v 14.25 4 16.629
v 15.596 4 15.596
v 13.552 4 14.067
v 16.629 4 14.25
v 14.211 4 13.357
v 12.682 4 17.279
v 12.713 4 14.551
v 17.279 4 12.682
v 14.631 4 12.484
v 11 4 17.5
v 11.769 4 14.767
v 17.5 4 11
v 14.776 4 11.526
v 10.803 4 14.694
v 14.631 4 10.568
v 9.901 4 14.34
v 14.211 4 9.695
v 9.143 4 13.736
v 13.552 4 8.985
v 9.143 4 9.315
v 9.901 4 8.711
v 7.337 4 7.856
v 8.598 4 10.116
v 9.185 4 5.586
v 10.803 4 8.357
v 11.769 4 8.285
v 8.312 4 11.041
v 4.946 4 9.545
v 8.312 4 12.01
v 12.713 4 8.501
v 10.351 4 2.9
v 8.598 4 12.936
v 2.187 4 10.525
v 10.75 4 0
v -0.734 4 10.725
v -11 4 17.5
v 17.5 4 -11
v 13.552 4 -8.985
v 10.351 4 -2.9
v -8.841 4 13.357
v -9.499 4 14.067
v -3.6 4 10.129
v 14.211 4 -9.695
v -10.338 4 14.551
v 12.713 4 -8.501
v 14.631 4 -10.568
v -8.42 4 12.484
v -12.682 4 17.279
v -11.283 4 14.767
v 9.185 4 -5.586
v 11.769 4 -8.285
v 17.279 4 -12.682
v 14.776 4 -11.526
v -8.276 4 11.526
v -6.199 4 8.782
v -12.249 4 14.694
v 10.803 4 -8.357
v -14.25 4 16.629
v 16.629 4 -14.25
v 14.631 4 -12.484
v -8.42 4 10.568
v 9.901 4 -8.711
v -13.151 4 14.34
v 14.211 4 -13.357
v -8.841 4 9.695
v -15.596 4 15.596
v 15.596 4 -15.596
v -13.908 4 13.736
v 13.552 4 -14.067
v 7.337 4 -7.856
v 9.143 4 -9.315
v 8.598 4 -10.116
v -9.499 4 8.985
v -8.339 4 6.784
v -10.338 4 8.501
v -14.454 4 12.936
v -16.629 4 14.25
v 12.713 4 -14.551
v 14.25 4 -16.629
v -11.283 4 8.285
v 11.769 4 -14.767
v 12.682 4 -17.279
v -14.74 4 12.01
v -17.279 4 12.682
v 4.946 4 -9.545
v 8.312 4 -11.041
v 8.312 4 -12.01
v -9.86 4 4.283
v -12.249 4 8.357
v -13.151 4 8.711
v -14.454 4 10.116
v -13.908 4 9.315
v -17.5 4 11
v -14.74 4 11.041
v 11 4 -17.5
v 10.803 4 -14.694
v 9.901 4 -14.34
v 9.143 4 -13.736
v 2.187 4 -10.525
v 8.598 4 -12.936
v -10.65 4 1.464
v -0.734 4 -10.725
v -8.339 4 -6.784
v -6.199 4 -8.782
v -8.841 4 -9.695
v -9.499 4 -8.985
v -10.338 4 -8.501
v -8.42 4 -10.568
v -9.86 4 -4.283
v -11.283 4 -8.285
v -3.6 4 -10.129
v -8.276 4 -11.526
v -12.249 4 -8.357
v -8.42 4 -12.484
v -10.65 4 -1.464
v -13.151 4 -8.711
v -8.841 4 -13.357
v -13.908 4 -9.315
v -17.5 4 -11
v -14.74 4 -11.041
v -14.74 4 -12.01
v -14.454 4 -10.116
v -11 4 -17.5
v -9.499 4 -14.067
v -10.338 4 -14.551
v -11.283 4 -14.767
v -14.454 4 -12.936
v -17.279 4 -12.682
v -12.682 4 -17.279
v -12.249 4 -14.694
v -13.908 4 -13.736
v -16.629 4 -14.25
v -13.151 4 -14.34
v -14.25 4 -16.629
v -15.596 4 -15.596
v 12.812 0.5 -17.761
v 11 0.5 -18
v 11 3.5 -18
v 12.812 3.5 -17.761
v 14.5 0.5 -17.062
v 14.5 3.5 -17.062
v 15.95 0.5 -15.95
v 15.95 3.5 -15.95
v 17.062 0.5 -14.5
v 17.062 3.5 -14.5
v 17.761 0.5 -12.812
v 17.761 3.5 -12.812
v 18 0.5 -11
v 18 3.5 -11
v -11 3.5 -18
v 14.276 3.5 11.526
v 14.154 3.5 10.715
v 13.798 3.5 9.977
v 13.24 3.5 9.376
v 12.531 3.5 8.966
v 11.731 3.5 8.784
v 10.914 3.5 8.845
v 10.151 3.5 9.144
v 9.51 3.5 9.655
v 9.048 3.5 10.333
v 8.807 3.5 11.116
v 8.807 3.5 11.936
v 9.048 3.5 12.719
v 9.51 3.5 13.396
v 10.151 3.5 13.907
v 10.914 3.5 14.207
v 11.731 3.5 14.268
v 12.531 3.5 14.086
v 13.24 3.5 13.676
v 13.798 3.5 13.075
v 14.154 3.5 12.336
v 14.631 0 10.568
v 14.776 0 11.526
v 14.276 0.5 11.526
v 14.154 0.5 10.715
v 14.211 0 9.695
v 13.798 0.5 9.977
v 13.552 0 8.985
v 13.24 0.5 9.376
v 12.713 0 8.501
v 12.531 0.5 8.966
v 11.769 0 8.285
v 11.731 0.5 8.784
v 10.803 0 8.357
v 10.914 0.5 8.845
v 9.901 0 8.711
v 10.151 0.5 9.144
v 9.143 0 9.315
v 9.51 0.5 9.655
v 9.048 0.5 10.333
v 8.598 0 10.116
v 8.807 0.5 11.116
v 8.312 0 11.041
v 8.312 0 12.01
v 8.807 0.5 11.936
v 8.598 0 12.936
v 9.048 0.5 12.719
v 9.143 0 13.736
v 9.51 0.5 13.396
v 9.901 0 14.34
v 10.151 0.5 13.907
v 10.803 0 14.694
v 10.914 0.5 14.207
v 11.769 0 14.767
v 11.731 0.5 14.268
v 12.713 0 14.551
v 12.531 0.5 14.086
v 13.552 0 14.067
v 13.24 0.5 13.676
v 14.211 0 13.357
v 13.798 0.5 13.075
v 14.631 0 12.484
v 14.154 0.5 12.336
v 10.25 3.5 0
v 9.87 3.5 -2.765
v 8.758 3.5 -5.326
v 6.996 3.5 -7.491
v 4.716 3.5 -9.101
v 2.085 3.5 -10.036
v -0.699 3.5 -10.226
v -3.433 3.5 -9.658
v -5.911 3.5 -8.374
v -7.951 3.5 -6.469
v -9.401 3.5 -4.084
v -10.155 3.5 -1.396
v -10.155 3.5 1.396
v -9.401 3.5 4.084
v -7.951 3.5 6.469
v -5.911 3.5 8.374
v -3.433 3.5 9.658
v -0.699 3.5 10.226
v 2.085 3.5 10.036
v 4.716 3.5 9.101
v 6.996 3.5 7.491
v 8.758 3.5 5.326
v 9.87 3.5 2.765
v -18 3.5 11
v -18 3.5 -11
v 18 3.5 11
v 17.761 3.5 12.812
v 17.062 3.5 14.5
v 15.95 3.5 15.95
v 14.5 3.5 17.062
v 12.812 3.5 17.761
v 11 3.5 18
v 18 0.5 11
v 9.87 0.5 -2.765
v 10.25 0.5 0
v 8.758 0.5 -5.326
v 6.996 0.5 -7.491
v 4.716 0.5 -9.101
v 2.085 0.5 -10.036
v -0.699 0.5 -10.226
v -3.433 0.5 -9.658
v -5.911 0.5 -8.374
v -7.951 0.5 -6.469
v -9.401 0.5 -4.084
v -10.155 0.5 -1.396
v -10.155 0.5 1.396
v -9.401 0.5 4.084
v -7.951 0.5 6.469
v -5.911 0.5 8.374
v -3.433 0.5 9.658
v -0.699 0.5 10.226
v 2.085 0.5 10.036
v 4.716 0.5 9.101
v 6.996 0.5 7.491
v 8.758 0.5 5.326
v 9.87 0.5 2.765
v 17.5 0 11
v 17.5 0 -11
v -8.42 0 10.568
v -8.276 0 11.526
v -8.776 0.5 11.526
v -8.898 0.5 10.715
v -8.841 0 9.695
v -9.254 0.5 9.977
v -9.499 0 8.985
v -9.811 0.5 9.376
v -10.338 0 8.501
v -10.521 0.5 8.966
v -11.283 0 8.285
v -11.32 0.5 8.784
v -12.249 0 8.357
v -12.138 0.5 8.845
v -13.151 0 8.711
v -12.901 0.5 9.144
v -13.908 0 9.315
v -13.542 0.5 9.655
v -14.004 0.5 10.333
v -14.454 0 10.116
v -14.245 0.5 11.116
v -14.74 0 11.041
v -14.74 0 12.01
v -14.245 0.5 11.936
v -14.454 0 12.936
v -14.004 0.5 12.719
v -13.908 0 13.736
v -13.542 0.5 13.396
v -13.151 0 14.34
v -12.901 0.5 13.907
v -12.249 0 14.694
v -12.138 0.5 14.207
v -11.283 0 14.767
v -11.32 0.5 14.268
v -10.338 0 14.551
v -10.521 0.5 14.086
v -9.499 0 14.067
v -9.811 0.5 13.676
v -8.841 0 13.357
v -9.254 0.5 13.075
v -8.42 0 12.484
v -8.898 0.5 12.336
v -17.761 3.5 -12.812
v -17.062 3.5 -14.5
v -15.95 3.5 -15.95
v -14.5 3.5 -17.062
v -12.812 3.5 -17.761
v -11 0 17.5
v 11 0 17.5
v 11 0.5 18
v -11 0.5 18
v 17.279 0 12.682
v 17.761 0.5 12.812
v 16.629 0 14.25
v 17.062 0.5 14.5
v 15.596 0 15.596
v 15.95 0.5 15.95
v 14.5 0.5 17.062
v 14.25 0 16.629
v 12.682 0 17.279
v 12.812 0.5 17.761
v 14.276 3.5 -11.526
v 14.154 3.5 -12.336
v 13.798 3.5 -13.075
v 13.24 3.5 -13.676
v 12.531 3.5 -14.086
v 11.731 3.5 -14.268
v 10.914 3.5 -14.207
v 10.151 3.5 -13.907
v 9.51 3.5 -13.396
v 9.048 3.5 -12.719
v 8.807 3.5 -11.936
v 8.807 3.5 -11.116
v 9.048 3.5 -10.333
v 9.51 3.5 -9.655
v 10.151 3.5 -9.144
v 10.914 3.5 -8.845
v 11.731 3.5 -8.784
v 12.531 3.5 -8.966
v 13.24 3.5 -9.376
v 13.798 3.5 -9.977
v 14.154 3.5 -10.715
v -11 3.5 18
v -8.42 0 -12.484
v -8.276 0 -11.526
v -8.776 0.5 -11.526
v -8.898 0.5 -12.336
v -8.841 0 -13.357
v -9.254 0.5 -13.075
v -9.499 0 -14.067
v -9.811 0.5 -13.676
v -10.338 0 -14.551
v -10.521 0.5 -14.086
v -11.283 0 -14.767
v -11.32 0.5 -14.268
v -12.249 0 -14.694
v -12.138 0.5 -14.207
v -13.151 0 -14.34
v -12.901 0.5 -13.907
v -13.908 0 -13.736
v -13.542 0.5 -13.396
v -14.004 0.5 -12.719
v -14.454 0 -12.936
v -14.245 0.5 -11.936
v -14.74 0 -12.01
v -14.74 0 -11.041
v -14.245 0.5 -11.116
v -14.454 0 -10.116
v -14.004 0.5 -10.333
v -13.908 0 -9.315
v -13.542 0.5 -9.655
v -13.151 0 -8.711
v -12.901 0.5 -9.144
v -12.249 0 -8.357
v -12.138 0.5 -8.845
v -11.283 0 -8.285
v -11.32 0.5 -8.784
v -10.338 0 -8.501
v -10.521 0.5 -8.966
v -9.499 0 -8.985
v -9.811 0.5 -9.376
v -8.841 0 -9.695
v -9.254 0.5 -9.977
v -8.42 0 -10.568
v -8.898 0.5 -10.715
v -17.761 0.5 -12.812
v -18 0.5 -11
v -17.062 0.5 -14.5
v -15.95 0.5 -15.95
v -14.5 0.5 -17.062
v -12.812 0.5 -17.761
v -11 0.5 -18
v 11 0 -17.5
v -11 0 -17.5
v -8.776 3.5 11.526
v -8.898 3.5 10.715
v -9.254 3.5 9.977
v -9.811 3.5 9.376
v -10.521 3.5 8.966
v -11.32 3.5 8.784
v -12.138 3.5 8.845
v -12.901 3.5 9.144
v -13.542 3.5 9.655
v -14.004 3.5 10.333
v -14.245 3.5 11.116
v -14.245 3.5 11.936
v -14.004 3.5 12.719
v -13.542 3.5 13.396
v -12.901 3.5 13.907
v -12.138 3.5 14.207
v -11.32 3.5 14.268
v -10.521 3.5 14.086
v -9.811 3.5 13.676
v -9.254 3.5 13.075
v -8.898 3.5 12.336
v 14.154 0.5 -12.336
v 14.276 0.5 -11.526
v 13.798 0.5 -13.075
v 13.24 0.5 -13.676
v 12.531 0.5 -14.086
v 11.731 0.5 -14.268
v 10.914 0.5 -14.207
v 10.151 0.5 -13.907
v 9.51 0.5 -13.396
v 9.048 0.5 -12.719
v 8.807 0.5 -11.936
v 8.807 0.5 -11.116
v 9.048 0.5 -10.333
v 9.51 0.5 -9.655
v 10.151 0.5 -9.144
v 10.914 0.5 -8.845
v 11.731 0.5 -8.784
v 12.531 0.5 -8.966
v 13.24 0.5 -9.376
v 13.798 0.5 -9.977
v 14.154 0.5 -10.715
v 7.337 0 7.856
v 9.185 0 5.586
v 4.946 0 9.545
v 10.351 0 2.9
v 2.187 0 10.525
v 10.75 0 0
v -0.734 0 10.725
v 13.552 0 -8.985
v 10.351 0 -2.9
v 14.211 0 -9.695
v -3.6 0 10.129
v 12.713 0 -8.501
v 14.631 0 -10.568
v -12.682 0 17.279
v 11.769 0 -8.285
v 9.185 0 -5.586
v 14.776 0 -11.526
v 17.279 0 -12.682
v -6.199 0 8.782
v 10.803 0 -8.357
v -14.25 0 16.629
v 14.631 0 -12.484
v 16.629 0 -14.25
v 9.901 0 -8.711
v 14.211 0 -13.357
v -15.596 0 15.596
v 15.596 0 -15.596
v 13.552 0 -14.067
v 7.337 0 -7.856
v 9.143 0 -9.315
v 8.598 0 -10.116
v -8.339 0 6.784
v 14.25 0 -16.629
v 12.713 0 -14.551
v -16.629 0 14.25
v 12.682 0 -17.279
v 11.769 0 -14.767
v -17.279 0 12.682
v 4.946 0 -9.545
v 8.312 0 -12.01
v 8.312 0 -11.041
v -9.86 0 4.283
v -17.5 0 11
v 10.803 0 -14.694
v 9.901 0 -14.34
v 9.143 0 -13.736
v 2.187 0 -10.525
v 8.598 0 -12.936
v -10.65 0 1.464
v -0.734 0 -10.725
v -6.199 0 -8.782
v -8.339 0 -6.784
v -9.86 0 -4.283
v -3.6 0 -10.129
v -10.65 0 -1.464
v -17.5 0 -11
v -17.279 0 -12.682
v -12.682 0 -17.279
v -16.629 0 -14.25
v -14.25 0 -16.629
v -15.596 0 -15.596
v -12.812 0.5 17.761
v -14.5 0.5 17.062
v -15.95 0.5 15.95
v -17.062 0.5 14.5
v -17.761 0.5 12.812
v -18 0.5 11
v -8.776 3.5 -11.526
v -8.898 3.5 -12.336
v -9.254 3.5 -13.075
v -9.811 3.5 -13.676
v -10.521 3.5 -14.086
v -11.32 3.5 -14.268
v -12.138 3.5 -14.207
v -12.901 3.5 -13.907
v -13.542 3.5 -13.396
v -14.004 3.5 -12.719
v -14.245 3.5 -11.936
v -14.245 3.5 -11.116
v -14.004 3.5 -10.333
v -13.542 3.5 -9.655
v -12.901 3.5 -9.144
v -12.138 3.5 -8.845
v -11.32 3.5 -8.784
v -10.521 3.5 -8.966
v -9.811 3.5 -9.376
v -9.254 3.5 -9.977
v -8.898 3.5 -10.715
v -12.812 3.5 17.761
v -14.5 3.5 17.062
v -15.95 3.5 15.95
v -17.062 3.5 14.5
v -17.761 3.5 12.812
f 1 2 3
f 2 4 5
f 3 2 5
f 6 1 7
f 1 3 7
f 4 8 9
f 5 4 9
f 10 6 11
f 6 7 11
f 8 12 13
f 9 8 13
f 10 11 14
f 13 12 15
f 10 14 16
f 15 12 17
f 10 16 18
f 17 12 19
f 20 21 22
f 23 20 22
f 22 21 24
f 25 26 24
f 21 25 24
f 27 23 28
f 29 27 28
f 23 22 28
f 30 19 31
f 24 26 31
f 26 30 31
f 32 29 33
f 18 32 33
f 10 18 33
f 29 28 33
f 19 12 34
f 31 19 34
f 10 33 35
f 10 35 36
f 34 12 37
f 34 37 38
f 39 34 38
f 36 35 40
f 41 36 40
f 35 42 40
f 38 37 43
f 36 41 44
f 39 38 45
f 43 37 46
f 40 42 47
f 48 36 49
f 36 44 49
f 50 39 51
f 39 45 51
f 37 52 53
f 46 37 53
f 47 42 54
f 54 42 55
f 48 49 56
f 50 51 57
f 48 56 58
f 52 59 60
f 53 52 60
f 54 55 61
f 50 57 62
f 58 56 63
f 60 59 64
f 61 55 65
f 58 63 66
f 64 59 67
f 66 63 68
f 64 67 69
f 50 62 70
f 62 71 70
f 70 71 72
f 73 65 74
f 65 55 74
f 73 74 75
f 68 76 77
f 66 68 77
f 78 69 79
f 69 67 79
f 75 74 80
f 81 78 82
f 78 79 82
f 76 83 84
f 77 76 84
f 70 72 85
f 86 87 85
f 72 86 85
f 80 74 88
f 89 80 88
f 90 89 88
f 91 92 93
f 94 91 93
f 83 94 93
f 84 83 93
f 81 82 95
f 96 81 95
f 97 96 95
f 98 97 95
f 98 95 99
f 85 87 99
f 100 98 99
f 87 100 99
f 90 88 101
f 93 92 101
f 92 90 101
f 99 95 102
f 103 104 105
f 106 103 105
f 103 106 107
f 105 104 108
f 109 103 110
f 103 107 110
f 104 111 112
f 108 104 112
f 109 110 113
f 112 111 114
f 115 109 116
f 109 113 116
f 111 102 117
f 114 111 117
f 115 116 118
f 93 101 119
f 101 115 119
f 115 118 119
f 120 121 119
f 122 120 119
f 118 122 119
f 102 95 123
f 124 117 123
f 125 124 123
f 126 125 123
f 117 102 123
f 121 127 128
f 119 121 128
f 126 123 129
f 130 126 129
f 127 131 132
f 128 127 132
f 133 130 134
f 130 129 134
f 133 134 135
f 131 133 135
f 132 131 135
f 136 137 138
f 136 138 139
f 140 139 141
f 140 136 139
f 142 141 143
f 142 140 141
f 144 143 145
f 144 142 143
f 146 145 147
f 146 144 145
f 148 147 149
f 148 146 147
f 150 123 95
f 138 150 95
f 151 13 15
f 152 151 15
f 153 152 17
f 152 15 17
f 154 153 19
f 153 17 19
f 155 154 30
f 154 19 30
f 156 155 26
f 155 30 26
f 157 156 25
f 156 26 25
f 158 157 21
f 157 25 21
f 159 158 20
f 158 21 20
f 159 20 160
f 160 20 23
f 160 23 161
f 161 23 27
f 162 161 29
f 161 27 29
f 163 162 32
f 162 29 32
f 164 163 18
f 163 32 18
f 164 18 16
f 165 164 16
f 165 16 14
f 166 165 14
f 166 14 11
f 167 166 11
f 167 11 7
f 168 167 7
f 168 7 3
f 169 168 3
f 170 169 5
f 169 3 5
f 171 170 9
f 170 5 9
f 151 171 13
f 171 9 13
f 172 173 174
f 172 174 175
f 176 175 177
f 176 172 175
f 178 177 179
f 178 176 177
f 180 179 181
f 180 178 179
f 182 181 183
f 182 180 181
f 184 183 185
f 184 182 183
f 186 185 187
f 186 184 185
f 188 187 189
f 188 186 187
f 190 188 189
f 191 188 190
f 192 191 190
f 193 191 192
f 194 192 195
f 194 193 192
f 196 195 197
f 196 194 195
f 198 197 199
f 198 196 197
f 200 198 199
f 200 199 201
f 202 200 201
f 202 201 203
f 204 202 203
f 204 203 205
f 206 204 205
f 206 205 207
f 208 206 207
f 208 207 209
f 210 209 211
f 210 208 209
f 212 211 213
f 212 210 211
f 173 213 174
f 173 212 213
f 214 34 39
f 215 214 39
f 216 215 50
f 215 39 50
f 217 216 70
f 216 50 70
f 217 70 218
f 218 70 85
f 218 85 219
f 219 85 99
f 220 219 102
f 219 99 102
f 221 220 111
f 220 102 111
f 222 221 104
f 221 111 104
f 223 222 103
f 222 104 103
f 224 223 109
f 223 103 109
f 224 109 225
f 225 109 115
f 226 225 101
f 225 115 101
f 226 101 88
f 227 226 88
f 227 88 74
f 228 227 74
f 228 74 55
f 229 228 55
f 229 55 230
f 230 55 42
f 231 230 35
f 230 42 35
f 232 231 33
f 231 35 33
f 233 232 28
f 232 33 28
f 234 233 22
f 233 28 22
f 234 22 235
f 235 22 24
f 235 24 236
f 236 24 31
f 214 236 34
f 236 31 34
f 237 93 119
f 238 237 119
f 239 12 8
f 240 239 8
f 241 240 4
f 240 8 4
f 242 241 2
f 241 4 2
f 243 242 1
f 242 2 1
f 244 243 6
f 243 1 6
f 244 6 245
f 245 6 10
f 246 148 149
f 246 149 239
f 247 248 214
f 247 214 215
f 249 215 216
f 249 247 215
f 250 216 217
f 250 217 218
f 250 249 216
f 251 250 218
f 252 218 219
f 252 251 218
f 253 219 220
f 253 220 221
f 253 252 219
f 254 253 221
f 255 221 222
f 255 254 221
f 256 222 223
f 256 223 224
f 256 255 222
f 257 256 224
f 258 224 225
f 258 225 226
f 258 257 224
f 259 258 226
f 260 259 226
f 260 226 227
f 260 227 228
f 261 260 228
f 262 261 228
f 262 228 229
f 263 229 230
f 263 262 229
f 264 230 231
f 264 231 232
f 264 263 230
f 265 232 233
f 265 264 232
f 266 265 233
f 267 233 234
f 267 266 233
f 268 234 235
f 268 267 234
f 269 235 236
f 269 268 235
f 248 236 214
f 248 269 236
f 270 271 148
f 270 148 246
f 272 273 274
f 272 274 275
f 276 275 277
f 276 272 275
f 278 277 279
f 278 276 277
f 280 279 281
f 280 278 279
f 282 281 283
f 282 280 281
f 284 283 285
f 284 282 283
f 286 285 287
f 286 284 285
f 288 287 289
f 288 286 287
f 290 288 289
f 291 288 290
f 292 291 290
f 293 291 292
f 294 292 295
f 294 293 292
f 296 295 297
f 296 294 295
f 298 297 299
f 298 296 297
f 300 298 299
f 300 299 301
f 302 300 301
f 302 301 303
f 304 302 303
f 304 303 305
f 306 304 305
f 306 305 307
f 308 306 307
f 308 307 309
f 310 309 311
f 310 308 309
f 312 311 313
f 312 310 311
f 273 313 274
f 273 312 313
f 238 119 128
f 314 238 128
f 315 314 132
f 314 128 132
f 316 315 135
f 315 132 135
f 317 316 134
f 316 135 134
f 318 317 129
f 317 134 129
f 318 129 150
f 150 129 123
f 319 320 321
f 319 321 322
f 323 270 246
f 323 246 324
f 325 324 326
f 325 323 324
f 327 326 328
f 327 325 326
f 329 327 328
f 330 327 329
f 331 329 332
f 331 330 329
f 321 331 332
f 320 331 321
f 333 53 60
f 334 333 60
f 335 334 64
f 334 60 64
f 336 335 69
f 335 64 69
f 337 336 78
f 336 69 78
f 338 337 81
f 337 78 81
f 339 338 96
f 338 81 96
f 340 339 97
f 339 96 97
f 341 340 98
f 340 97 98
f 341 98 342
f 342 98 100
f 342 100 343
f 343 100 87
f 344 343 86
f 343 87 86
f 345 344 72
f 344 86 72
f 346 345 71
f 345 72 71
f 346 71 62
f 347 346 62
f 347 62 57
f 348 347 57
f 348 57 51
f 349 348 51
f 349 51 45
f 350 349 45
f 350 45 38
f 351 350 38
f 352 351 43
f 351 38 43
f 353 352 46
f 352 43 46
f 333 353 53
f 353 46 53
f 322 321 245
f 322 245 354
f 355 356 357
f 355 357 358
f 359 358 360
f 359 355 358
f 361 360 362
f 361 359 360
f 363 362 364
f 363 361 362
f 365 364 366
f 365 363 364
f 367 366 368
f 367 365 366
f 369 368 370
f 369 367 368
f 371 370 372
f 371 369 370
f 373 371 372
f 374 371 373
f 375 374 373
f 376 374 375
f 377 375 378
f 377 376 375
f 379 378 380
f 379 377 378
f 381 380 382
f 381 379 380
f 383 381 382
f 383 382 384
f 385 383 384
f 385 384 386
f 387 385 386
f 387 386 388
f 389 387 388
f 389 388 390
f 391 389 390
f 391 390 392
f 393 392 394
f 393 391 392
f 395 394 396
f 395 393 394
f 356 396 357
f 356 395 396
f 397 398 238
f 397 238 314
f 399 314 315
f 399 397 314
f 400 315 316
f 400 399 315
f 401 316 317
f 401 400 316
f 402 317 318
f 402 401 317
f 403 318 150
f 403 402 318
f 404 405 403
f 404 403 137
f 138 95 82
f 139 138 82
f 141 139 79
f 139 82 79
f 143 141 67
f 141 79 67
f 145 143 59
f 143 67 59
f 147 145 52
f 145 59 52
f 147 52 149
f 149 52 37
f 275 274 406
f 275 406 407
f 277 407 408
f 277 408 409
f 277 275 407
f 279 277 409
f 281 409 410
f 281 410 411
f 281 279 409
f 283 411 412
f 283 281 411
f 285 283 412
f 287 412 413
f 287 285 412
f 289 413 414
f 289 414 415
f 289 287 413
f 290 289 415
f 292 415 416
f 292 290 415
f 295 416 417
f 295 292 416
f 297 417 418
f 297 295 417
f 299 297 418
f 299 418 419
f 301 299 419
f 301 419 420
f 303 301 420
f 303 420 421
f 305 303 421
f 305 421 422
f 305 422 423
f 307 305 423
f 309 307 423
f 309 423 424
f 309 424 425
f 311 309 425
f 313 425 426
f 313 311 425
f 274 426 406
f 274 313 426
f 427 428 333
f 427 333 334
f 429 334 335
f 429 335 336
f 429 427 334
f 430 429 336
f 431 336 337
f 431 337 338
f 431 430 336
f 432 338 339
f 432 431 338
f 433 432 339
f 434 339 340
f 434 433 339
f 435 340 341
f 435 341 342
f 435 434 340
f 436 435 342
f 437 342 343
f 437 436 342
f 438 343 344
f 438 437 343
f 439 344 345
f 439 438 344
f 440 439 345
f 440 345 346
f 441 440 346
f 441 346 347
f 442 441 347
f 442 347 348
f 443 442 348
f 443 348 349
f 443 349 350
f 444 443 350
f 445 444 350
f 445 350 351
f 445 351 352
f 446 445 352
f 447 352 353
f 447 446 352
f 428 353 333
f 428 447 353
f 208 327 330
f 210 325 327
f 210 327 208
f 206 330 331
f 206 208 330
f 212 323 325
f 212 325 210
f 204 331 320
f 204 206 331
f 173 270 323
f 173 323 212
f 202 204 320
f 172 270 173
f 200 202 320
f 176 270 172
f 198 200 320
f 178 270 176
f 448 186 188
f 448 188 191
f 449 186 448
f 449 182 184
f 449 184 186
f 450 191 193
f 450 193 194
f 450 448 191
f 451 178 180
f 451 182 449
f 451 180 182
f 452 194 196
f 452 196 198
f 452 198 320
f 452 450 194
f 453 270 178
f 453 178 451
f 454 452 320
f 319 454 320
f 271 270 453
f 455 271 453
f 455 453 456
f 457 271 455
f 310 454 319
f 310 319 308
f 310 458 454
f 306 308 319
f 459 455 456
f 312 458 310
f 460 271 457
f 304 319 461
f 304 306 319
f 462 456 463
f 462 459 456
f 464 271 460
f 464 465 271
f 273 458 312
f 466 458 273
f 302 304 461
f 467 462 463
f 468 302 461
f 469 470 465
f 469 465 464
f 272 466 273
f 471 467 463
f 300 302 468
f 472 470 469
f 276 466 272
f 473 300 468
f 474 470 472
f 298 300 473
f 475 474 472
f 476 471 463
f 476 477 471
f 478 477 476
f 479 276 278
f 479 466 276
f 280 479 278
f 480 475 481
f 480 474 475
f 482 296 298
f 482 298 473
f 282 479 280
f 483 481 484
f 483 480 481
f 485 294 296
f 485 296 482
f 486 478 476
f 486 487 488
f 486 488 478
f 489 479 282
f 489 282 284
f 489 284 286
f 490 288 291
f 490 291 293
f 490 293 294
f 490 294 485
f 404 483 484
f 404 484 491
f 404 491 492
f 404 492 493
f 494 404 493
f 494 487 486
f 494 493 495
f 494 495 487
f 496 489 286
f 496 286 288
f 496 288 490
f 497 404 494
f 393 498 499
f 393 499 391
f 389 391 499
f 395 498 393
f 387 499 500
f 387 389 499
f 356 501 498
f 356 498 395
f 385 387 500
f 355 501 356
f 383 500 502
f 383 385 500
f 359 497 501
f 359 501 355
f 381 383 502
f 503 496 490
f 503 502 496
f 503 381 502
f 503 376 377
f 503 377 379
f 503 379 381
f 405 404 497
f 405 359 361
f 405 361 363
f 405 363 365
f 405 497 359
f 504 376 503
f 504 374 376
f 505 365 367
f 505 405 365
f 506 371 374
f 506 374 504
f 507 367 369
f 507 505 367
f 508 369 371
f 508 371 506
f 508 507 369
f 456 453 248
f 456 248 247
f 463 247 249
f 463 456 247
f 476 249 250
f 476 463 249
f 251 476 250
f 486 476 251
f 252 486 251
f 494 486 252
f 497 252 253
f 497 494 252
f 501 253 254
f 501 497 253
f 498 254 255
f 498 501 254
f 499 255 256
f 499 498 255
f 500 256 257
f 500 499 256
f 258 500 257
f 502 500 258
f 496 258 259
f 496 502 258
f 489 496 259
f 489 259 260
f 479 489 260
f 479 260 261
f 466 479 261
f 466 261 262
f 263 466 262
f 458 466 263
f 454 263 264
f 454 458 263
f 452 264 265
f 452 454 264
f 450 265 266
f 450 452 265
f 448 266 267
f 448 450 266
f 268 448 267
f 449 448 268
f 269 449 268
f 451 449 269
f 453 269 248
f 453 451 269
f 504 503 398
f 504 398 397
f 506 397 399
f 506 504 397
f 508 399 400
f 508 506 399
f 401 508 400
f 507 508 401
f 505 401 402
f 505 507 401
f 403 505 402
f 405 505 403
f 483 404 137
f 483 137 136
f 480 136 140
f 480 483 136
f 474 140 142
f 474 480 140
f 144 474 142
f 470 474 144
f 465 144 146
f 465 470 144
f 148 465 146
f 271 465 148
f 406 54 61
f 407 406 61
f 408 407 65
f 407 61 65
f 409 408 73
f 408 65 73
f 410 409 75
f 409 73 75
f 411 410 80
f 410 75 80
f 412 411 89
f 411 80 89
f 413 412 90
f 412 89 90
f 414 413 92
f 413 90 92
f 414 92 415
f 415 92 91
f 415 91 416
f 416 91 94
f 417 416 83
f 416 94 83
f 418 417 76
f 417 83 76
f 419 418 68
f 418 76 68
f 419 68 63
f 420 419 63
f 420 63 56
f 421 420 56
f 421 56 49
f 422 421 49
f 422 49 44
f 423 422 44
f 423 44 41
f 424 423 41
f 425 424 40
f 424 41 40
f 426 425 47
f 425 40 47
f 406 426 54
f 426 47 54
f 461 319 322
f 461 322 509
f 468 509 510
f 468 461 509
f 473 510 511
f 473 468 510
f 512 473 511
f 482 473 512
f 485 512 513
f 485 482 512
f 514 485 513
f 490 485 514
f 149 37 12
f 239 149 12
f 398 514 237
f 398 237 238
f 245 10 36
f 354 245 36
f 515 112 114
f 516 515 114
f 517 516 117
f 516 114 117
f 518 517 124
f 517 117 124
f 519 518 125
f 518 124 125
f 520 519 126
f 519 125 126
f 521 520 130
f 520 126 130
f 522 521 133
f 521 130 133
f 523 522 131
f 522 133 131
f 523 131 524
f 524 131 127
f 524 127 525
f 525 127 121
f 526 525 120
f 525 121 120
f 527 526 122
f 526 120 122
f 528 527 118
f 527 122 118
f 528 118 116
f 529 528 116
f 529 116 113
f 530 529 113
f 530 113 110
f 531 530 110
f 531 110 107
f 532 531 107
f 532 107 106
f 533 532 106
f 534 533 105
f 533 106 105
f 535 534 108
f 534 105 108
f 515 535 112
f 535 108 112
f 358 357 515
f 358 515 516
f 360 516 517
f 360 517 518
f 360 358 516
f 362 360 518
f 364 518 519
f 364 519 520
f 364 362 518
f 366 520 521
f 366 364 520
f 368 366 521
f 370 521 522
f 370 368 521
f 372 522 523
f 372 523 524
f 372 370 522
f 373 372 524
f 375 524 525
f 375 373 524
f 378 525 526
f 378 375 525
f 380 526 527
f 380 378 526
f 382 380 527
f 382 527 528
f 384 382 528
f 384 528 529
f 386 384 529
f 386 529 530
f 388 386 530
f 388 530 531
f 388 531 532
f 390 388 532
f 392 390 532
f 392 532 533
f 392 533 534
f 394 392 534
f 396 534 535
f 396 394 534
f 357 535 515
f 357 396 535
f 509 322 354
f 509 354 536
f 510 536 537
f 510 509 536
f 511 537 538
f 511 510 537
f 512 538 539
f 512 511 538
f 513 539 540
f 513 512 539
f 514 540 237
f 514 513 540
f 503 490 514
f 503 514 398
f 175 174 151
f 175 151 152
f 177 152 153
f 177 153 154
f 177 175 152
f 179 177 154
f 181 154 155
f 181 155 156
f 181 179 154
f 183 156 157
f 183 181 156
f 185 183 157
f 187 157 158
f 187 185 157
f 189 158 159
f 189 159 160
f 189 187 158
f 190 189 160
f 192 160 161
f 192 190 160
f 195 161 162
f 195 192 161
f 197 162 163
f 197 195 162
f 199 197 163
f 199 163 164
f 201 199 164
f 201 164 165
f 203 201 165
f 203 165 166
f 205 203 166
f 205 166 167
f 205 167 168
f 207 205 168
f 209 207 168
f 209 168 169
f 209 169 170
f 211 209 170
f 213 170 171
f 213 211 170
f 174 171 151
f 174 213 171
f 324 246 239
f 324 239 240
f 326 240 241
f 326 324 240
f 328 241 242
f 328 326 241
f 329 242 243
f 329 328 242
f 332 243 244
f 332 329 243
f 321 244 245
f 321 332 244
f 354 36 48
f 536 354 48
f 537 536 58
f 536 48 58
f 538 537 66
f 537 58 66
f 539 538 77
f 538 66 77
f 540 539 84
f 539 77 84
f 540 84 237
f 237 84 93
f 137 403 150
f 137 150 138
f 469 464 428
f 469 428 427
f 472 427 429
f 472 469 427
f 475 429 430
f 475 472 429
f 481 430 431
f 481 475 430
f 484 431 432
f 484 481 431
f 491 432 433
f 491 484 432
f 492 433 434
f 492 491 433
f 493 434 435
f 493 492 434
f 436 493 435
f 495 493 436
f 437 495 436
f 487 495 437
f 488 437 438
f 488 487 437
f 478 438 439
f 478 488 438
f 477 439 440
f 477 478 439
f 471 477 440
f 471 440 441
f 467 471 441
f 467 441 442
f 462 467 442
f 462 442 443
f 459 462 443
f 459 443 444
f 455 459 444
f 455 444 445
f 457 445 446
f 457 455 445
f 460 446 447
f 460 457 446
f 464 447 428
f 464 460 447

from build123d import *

# Parameters (mm, degrees)
SKETCH1_R           = 10.25
SKETCH1_R_2         = 2.75
BOSS_EXTRUDE1_DEPTH = 4
CHAMFER1_SIZE       = 0.5


with BuildPart() as part:
    # Sketch1 → Boss-Extrude1 (new body)
    with BuildSketch(Plane(origin=(0, 0, 0), x_dir=(1, 0, 0), z_dir=(0, 1, 0))):
        with BuildLine():
            Line((-11, 18), (11, 18))
            ThreePointArc((11, 18), (15.949747468, 15.949747468), (18, 11))
            Line((18, 11), (18, -11))
            ThreePointArc((18, -11), (15.949747468, -15.949747468), (11, -18))
            Line((11, -18), (-11, -18))
            ThreePointArc((-11, -18), (-15.949747468, -15.949747468), (-18, -11))
            Line((-18, -11), (-18, 11))
            ThreePointArc((-18, 11), (-15.949747468, 15.949747468), (-11, 18))
        make_face()
        Circle(SKETCH1_R, mode=Mode.SUBTRACT)
        with Locations((-11.525840533, 11.525840533)):
            Circle(SKETCH1_R_2, mode=Mode.SUBTRACT)
        with Locations((11.525840533, 11.525840533)):
            Circle(SKETCH1_R_2, mode=Mode.SUBTRACT)
        with Locations((11.525840533, -11.525840533)):
            Circle(SKETCH1_R_2, mode=Mode.SUBTRACT)
        with Locations((-11.525840533, -11.525840533)):
            Circle(SKETCH1_R_2, mode=Mode.SUBTRACT)
    extrude(amount=BOSS_EXTRUDE1_DEPTH)

    # Chamfer1
    chamfer1_edges = [part.edges().sort_by_distance(p)[0] for p in [
        (18, 0, 0),
        (15.949747468, 0, 15.949747468),
        (0, 0, 18),
        (-15.949747468, 0, 15.949747468),
        (15.949747468, 4, 15.949747468),
        (18, 4, 0),
        (15.949747468, 4, -15.949747468),
        (-10.25, 0, 0),
        (-10.25, 4, 0),
        (0, 4, -18),
        (-14.275840533, 0, -11.525840533),
        (-14.275840533, 4, -11.525840533),
        (-15.949747468, 4, -15.949747468),
        (8.775840533, 0, -11.525840533),
        (8.775840533, 4, -11.525840533),
        (-18, 4, 0),
        (8.775840533, 0, 11.525840533),
        (8.775840533, 4, 11.525840533),
        (-14.275840533, 0, 11.525840533),
        (-14.275840533, 4, 11.525840533),
        (-15.949747468, 4, 15.949747468),
        (-18, 0, 0),
        (0, 4, 18),
        (-15.949747468, 0, -15.949747468),
        (0, 0, -18),
        (15.949747468, 0, -15.949747468),
    ]]
    chamfer(chamfer1_edges, length=CHAMFER1_SIZE)


solid = part.part
